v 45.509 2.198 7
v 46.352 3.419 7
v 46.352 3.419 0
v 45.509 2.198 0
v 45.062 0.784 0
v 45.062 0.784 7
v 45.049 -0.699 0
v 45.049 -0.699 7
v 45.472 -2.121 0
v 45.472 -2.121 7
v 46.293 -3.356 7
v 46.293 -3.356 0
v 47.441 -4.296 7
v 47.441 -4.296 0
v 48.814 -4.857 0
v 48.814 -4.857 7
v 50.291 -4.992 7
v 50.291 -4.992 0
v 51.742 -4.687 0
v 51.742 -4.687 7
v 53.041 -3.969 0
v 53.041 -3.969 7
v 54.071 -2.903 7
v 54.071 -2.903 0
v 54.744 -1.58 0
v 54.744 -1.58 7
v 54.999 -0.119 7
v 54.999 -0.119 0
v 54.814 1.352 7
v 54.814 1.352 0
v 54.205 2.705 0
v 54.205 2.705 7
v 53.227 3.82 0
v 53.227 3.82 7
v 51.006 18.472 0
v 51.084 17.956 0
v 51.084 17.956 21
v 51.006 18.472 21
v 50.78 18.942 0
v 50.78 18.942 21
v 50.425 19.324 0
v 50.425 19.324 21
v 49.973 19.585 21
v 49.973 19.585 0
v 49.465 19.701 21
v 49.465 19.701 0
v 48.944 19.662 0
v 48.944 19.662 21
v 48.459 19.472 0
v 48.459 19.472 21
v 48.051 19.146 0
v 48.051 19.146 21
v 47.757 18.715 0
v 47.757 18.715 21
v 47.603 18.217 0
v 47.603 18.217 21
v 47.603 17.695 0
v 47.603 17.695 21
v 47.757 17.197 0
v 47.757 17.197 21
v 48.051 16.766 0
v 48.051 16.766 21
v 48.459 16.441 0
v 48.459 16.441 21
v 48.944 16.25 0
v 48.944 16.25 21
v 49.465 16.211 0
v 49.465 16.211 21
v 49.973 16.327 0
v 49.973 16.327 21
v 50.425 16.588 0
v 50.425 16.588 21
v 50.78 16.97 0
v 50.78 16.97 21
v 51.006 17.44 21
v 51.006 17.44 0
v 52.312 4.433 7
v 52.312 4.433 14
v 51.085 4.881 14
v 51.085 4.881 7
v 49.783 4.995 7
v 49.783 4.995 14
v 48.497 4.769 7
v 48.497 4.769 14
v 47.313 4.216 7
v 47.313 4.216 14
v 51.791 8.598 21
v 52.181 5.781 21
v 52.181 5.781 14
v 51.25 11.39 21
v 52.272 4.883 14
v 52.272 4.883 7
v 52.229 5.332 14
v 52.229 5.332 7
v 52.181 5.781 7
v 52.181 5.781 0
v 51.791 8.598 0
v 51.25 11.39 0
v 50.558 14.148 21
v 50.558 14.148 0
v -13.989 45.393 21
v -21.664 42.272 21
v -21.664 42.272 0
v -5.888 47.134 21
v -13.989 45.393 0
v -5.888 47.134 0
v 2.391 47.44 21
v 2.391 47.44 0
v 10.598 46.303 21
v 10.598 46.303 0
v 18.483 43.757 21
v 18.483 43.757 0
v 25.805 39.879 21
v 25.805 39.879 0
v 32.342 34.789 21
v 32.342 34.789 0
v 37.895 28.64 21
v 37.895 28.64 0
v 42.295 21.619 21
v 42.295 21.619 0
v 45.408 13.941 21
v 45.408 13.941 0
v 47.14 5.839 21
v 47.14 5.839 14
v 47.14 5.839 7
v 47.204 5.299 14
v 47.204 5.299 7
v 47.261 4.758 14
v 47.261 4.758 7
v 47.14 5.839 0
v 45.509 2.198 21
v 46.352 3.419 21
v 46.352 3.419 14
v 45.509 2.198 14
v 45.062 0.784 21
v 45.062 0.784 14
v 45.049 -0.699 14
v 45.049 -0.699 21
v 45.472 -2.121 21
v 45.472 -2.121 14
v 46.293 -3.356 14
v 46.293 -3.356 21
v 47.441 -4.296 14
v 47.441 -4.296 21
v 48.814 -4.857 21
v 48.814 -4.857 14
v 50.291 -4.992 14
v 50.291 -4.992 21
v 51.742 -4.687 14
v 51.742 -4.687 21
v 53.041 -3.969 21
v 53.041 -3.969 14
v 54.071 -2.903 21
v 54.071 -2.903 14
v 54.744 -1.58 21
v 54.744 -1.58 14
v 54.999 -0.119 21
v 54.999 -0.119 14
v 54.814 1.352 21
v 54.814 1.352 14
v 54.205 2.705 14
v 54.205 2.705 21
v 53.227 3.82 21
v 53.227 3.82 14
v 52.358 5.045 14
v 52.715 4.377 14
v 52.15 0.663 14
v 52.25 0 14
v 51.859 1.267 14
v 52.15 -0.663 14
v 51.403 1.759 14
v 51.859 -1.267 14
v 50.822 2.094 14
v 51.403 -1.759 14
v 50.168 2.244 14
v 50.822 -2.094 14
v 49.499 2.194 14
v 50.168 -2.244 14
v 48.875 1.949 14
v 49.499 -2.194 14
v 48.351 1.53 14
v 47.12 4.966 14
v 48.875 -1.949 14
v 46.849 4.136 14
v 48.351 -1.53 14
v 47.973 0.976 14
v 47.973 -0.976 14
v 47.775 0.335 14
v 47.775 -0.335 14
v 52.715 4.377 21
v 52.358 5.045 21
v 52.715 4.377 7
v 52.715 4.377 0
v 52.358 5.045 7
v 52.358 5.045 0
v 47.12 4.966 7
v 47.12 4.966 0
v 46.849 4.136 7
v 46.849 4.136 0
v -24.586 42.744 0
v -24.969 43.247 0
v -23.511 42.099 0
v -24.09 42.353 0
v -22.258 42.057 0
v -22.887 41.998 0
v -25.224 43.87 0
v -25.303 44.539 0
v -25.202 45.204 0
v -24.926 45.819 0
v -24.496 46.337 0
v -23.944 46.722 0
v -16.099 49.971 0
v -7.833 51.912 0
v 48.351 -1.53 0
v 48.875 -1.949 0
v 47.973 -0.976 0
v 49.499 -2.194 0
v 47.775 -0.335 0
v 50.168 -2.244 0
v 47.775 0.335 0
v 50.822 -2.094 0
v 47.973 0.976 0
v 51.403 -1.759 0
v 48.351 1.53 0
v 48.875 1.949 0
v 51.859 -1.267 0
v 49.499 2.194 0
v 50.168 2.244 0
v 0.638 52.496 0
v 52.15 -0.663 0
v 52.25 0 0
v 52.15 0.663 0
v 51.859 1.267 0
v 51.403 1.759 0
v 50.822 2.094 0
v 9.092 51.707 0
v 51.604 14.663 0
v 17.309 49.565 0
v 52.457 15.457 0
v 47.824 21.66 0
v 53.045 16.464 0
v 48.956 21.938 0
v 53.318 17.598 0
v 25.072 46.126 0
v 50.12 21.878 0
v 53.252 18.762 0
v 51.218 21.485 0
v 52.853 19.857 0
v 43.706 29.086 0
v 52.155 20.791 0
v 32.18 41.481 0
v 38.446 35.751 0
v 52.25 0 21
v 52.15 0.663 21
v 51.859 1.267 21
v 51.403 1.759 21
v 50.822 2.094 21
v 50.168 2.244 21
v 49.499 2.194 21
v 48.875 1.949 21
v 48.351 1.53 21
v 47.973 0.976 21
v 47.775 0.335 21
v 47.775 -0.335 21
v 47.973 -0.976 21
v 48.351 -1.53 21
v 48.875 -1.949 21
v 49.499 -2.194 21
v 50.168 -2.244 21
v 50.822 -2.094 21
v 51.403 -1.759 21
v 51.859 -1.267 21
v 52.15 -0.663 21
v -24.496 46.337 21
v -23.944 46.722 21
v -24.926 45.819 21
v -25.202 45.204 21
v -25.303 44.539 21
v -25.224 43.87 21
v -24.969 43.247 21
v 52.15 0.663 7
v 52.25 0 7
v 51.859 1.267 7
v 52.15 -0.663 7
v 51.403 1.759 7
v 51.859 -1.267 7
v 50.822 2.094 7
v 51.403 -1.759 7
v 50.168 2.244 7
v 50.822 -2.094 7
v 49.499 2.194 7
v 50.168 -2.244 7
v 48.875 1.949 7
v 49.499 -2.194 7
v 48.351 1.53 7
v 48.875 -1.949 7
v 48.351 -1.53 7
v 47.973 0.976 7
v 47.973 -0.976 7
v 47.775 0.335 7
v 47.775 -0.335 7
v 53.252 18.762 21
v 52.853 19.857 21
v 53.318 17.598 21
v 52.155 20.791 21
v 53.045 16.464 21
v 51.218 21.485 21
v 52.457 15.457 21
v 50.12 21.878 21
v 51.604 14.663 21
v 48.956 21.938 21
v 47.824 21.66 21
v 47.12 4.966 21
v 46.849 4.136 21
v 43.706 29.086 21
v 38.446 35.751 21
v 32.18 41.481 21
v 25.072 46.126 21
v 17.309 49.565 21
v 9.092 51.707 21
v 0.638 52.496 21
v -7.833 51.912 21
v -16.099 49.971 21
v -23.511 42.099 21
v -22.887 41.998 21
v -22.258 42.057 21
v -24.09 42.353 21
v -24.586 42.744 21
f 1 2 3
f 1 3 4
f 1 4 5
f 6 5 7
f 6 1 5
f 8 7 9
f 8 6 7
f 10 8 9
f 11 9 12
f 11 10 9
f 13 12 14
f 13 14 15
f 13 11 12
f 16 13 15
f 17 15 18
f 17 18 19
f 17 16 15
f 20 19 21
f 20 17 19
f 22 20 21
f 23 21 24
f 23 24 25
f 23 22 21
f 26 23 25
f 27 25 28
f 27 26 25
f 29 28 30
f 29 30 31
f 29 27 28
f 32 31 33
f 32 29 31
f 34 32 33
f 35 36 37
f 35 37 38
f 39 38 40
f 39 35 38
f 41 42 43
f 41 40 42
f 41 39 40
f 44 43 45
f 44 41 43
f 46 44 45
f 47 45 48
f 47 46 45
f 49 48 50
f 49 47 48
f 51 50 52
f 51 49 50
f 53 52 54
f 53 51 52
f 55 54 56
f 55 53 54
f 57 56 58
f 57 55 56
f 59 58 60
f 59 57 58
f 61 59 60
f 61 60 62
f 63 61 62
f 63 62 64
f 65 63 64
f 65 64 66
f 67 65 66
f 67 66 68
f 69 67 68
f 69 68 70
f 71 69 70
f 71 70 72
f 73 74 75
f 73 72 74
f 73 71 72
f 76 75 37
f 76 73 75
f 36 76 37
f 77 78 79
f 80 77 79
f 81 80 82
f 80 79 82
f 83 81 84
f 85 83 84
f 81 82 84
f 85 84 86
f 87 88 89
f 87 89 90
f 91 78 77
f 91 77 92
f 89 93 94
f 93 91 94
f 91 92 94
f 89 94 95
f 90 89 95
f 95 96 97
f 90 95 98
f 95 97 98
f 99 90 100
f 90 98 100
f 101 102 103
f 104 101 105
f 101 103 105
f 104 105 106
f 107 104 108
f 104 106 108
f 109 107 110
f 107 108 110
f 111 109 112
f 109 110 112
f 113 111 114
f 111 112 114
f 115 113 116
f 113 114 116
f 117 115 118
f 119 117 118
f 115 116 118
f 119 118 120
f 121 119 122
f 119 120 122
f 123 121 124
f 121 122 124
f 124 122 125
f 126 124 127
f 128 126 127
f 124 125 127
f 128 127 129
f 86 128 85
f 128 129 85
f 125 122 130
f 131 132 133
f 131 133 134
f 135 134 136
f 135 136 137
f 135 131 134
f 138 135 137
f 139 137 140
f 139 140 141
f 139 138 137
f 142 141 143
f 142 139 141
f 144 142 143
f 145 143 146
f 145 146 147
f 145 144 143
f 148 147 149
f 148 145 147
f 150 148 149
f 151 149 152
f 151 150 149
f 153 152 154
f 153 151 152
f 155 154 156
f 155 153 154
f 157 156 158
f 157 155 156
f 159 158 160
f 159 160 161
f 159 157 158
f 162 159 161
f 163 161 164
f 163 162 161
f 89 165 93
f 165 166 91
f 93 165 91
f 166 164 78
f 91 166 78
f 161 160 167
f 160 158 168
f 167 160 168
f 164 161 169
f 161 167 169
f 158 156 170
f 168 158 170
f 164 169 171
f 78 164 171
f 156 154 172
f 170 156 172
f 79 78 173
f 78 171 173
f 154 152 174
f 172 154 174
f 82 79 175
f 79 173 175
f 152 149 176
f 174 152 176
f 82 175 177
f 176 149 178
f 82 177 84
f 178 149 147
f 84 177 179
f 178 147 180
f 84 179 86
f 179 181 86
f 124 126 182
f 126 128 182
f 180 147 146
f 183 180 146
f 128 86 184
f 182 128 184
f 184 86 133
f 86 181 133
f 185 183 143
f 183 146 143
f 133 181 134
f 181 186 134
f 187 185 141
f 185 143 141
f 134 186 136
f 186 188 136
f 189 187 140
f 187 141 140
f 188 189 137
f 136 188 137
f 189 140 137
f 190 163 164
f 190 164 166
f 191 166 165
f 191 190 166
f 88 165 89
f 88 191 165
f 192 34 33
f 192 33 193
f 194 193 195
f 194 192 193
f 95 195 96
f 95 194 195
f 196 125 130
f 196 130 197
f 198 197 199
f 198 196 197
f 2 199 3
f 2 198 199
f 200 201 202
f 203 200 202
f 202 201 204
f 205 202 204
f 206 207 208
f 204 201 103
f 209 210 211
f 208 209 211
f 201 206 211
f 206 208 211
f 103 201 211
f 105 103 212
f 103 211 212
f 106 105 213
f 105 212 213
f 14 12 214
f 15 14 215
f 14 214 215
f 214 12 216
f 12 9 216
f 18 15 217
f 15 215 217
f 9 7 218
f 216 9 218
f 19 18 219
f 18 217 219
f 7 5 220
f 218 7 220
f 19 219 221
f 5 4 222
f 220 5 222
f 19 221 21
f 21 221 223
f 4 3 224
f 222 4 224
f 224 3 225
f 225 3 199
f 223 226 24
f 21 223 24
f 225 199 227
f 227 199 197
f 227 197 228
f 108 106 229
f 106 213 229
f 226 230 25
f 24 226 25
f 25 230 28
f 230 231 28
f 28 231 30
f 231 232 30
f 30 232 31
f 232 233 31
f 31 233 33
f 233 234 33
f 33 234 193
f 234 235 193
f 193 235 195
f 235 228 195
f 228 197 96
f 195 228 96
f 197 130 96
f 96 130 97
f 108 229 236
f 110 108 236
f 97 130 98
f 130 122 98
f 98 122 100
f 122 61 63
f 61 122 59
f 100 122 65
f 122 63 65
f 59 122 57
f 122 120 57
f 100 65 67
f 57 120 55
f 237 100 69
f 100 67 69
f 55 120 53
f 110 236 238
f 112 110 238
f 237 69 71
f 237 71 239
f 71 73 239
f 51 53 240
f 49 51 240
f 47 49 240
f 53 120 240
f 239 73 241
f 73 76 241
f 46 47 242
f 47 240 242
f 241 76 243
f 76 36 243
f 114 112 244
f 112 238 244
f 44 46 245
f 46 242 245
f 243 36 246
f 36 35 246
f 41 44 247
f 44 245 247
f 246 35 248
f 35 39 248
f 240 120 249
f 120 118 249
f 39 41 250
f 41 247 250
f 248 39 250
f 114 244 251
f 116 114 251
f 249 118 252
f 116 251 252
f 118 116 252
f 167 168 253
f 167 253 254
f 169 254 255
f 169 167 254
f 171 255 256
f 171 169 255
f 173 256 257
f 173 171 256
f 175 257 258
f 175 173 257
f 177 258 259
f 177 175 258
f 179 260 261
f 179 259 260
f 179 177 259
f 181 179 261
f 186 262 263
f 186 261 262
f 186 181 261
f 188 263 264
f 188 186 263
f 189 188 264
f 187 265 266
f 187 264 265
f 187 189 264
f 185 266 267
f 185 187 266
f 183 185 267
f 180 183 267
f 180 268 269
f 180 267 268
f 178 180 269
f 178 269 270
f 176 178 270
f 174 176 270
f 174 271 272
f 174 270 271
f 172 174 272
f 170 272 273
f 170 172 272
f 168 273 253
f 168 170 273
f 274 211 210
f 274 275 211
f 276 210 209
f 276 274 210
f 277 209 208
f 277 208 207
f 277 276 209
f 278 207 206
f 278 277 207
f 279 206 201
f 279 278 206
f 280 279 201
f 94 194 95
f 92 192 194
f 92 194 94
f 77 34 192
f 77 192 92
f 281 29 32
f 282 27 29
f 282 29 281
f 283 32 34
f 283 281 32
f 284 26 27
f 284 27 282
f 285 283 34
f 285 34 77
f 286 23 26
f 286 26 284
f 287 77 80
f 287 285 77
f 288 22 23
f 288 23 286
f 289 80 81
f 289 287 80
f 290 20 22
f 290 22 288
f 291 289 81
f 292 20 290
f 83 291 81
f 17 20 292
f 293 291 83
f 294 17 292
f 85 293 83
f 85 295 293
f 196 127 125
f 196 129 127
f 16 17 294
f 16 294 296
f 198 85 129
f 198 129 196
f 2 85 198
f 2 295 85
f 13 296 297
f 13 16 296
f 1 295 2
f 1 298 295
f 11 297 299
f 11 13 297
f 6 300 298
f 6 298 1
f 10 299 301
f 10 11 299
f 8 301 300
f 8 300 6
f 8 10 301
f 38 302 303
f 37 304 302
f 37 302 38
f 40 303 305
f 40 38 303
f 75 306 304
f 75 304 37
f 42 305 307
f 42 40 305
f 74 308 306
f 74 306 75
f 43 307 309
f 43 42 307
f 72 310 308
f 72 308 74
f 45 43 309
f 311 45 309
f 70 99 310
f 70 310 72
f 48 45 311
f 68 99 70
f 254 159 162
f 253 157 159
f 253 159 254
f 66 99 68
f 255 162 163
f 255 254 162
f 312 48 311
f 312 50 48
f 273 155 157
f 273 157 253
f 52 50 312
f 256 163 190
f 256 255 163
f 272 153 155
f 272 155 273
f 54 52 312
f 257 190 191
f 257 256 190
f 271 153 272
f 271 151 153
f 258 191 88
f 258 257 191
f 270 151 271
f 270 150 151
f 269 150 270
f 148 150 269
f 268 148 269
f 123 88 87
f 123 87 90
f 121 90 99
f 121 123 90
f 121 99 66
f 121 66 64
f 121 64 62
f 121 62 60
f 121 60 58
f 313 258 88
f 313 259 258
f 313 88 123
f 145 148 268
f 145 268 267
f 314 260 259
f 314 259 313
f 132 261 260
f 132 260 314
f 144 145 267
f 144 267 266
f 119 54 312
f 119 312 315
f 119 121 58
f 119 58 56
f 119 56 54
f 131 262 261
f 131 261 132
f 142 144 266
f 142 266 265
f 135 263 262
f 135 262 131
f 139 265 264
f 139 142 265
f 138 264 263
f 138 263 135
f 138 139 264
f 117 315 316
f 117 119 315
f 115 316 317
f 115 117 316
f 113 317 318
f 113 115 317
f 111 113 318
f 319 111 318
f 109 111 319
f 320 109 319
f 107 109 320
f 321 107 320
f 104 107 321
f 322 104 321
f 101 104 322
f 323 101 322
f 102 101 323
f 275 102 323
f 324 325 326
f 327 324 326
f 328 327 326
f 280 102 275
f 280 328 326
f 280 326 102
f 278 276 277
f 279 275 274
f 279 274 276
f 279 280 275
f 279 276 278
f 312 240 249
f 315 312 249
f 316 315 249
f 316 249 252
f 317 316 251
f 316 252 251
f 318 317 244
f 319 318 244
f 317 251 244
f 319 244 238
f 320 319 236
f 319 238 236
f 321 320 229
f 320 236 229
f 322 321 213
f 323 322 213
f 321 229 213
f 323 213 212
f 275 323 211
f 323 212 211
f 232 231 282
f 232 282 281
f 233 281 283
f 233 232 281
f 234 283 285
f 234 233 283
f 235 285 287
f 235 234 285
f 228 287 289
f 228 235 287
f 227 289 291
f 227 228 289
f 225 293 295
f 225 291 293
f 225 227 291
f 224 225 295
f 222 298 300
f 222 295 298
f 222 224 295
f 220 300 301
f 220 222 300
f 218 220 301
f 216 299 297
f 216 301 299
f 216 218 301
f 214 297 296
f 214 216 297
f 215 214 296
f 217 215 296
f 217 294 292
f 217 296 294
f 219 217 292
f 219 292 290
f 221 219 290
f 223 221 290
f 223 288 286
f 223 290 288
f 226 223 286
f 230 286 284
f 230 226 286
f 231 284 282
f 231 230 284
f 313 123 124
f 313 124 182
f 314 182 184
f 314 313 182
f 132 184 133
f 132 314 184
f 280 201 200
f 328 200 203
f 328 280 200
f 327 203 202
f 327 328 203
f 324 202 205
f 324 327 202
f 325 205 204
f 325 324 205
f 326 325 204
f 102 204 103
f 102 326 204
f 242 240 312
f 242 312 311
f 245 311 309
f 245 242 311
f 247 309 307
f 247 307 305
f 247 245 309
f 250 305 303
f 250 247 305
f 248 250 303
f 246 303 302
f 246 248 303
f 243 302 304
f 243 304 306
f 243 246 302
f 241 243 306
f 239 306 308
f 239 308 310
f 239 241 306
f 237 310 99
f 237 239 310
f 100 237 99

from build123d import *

# Parameters (mm, degrees)
EXTRU_MINCE1_DEPTH           = 21
ESQUISSE4_R                  = 4.9999999999999964
BOSS_EXTRU_2_DEPTH           = 21
ENL_V_MAT_EXTRU_2_DEPTH      = 79.88123984826811
ENL_V_MAT_EXTRU_2_DEPTH_BACK = 79.88123984826811
ESQUISSE5_R                  = 2.250000000000002
ENL_V_START                  = -7
ESQUISSE6_R                  = 4.9999999999999964
ENL_V_MAT_EXTRU_3_DEPTH      = 7
CONG_4_R                     = 3
CONG_6_R                     = 2.5
BOSS_EXTRU_3_START           = -21
BOSS_EXTRU_3_DEPTH           = 21
ENL_V_MAT_EXTRU_4_DEPTH      = 79.88123984826811
ENL_V_MAT_EXTRU_4_DEPTH_BACK = 79.88123984826811
ESQUISSE8_R                  = 1.7500000000000038


# Some blends are built 0.0001 mm under size
with BuildPart() as part:
    # Esquisse1 → Extru.-Mince1 (new body)
    with BuildSketch(Plane.XY):
        with BuildLine():
            ThreePointArc((52.49999999999999, 4.2e-16), (26.249999999999886, 45.46633369868308), (-26.250000000000224, 45.4663336986829))
            Line((-26.250000000000224, 45.4663336986829), (-23.750000000000203, 41.13620667976072))
            ThreePointArc((-23.750000000000203, 41.13620667976072), (23.749999999999897, 41.13620667976088), (47.49999999999999, -4.2e-16))
            Line((47.49999999999999, -4.2e-16), (52.49999999999999, 4.2e-16))
        make_face()
    extrude(amount=EXTRU_MINCE1_DEPTH)

    # Esquisse4 → Boss.-Extru.2 (add)
    with BuildSketch(Plane.XY.offset(21)):
        with Locations((50, 0)):
            Circle(ESQUISSE4_R)
    extrude(amount=-BOSS_EXTRU_2_DEPTH)

    # Esquisse5 → Enlèv. mat.-Extru.2 (cut, two sides: drawn at the far end of the back side and taken through both)
    with BuildSketch(Plane.XY.offset(21).offset(-ENL_V_MAT_EXTRU_2_DEPTH_BACK)):
        with Locations((50, 0)):
            Circle(ESQUISSE5_R)
    extrude(amount=ENL_V_MAT_EXTRU_2_DEPTH + ENL_V_MAT_EXTRU_2_DEPTH_BACK, mode=Mode.SUBTRACT)

    # Esquisse6 → Enlèv. mat.-Extru.3 (cut)
    with BuildSketch(Plane.XY.offset(21).offset(ENL_V_START)):
        with Locations((50, 0)):
            Circle(ESQUISSE6_R)
    extrude(amount=-ENL_V_MAT_EXTRU_3_DEPTH, mode=Mode.SUBTRACT)

    # Congé4
    # the kernel refuses this fillet: 3 mm, written as the material it adds along each edge
    with BuildSketch(Plane(origin=(47.3125, 4.216318743880709, 21), x_dir=(-0.7695454862891271, -0.6385920016192113, 0), z_dir=(0, 0, -1)), Plane(origin=(47.3125, 4.216318743880709, 7), x_dir=(-0.7695454862891271, -0.6385920016192113, 0), z_dir=(0, 0, -1))) as cong_4_piece_1:
        with BuildLine():
            CenterArc((1.6233202224653038, 2.976519037476766), CONG_4_R, 212.62585704290902, 50.20084903739968)
            ThreePointArc((-0.903307284750997, 1.359066274711204), (-0.45749046797105886, 0.6756536745373425), (0, 0))
            ThreePointArc((0, 0), (0.6243539317174114, 0.03913493753872468), (1.2487078634348219, 4e-17))
        make_face()
    extrude(amount=7)
    with BuildSketch(Plane(origin=(52.3125, 4.433096406576334, 21), x_dir=(0.8303156074241137, -0.5572934523820687, 0), z_dir=(0, 0, -1)), Plane(origin=(52.3125, 4.433096406576334, 7), x_dir=(0.8303156074241137, -0.5572934523820687, 0), z_dir=(0, 0, -1))) as cong_4_piece_2:
        with BuildLine():
            CenterArc((1.4311199733874571, -2.981766146537774), CONG_4_R, 96.3202818650538, 43.48897964287826)
            ThreePointArc((-0.8605810852935136, -1.0457634973555643), (-0.4269182279533879, -0.5256568983613493), (0, 0))
            ThreePointArc((0, 0), (0.5504307589951836, -0.03038975577037968), (1.100861517990363, 3e-17))
        make_face()
    extrude(amount=7)

    # Congé6
    cong_6_edges = [part.edges().sort_by_distance(p)[0] for p in [
        (-26.25000000000022, 45.46633369868291, 10.5),
        (-23.750000000000203, 41.13620667976072, 10.5),
    ]]
    fillet(cong_6_edges, radius=CONG_6_R - 0.0001)  # a hair under: the kernel refuses the full size

    # Esquisse7 → Boss.-Extru.3 (add)
    with BuildSketch(Plane.XY.offset(21).offset(BOSS_EXTRU_3_START)):
        with BuildLine():
            ThreePointArc((47.82358383341308, 21.659982209792123), (53.09263307440395, 19.324138097899965), (50.5577588361061, 14.147898129055626))
            ThreePointArc((50.5577588361061, 14.147898129055626), (49.33386259126014, 17.956057524597252), (47.82358383341308, 21.659982209792123))
        make_face()
    extrude(amount=BOSS_EXTRU_3_DEPTH)

    # Esquisse8 → Enlèv. mat.-Extru.4 (cut, two sides: drawn at the far end of the back side and taken through both)
    with BuildSketch(Plane.XY.offset(21).offset(-ENL_V_MAT_EXTRU_4_DEPTH_BACK)):
        with Locations((49.333862591260306, 17.956057524597313)):
            Circle(ESQUISSE8_R)
    extrude(amount=ENL_V_MAT_EXTRU_4_DEPTH + ENL_V_MAT_EXTRU_4_DEPTH_BACK, mode=Mode.SUBTRACT)


solid = part.part
